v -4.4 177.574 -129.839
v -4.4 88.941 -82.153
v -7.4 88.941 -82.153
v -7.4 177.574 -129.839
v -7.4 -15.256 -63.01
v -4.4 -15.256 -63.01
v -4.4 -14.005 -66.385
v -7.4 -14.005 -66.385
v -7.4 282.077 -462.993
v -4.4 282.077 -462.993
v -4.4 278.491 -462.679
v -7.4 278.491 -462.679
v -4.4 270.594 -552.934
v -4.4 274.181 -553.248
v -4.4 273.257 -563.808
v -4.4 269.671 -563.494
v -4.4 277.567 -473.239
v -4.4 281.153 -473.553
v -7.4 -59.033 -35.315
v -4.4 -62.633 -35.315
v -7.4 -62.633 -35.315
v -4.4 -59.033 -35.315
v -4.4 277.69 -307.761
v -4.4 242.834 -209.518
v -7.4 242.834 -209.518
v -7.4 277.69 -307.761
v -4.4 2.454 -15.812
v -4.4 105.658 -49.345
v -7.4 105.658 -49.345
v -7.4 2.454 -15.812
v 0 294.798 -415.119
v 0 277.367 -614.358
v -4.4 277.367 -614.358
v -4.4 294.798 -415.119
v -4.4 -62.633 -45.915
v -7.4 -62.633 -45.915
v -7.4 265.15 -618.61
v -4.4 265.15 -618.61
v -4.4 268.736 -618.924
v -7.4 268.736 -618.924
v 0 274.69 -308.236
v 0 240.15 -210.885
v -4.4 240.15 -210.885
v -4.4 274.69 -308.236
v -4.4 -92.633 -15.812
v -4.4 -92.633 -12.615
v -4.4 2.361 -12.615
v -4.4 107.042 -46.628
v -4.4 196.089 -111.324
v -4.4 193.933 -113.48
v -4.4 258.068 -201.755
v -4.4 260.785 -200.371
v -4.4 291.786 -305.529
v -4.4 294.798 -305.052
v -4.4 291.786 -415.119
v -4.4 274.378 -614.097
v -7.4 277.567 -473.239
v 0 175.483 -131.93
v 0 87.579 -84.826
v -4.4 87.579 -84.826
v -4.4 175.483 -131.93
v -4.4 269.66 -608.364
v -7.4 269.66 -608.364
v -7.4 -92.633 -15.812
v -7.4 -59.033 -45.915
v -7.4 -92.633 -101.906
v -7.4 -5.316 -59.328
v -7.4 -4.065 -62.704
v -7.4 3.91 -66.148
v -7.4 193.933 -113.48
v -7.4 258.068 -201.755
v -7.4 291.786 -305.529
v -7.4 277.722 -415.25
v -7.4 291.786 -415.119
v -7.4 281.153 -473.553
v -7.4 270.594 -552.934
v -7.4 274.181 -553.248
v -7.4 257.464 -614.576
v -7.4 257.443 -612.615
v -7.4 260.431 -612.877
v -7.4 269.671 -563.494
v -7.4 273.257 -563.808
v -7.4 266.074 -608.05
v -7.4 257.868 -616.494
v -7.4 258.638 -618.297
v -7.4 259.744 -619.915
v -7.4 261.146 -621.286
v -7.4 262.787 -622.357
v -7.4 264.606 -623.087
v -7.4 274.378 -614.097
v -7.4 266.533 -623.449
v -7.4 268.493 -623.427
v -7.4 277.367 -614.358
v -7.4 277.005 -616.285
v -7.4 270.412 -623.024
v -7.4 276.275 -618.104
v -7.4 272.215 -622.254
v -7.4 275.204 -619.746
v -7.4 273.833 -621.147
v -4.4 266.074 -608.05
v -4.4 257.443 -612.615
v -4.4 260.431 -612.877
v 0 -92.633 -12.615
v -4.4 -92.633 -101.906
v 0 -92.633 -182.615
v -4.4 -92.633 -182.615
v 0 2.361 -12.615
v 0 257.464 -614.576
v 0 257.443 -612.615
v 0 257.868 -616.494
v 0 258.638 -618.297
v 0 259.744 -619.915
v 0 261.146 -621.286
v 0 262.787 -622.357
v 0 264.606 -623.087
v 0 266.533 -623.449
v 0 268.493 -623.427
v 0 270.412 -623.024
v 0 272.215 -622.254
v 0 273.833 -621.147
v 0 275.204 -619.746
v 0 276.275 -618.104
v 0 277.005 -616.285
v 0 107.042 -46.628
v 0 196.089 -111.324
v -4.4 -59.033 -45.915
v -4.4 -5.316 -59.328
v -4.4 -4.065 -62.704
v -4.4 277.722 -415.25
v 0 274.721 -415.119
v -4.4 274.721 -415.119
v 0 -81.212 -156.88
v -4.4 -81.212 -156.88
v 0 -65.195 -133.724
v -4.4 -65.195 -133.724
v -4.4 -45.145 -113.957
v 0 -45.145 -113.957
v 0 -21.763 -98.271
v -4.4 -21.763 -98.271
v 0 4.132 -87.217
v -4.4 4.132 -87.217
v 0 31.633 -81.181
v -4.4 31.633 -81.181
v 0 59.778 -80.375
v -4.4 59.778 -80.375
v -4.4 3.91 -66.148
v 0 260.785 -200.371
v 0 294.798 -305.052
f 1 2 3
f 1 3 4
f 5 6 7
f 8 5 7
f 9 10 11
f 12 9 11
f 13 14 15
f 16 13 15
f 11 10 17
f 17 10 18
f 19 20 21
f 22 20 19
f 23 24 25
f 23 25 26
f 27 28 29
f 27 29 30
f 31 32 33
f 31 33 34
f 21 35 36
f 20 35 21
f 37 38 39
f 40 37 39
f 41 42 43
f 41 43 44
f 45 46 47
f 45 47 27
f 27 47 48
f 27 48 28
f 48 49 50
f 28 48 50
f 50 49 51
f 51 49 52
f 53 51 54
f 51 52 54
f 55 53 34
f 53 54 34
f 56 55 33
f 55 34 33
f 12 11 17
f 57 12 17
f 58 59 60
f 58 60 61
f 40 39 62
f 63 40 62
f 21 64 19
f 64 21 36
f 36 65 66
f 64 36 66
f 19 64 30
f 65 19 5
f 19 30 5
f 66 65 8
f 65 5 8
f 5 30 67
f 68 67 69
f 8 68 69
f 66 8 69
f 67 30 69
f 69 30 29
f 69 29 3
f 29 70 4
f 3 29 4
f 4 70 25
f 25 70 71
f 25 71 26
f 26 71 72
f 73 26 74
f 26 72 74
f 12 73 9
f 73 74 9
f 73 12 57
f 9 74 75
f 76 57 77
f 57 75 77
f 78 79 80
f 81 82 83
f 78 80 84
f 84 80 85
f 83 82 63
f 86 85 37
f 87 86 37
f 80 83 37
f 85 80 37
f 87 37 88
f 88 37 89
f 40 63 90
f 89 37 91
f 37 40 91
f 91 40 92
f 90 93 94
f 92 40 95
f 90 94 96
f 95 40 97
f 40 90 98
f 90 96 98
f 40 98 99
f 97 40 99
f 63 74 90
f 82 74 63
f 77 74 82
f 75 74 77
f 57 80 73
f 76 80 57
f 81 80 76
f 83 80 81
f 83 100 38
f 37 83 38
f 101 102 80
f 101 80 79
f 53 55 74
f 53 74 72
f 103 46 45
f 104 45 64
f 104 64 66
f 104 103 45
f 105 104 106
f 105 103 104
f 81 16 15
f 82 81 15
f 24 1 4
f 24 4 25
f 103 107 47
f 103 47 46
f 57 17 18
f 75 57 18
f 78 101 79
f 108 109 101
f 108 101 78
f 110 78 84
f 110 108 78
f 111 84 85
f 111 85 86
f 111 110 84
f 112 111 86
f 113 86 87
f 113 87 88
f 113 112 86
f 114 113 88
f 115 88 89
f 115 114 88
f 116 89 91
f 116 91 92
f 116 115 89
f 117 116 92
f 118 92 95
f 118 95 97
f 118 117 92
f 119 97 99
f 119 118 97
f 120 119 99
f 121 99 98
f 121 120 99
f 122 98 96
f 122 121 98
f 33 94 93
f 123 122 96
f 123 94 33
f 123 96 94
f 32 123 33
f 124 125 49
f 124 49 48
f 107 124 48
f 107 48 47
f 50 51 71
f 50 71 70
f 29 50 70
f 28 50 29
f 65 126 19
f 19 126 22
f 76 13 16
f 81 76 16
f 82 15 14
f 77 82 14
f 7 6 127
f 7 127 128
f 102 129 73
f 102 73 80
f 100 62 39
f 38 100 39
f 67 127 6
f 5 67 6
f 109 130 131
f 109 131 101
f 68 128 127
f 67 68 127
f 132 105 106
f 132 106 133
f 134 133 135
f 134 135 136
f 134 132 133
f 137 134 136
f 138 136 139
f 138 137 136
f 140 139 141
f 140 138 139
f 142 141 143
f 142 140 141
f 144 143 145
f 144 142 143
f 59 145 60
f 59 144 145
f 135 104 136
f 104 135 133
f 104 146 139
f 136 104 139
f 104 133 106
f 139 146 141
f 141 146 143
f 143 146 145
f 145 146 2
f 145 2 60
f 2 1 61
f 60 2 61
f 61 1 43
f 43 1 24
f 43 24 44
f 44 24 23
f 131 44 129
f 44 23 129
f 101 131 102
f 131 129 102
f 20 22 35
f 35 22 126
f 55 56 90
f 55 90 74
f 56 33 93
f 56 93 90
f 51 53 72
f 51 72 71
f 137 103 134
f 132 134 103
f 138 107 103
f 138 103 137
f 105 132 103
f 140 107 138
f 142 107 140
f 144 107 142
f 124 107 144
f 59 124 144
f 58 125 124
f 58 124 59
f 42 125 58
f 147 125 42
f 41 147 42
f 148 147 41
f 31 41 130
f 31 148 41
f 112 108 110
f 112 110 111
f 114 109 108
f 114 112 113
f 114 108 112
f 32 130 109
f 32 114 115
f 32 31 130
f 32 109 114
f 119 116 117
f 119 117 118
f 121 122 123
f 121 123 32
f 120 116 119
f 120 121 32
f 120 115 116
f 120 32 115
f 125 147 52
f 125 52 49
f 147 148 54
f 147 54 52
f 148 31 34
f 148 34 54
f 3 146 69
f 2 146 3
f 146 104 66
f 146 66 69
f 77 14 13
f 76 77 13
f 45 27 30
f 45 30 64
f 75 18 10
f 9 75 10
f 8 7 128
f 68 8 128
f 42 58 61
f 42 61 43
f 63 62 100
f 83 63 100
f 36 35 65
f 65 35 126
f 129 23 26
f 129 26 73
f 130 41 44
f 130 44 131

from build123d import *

# Parameters (mm, degrees)
BOSS_EXTRUDE1_DEPTH = 4.4
SKETCH2_W           = 10.6
SKETCH2_H           = 3.6
BOSS_EXTRUDE2_DEPTH = 3


with BuildPart() as part:
    # Sketch1 → Boss-Extrude1 (new body)
    with BuildSketch(Plane(origin=(0, 0, 0), x_dir=(0, 0, -1), z_dir=(1, 0, 0))):
        with BuildLine():
            Line((12.615293263, -92.633282396), (182.615293263, -92.633282396))
            ThreePointArc((182.615293263, -92.633282396), (98.271459614, -21.762843967), (84.825943994, 87.579368501))
            Line((84.825943994, 87.579368501), (131.929787104, 175.483372313))
            Line((131.929787104, 175.483372313), (210.884858569, 240.150484061))
            Line((210.884858569, 240.150484061), (308.236471933, 274.689971372))
            Line((308.236471933, 274.689971372), (415.1194685, 274.721469403))
            Line((415.1194685, 274.721469403), (612.615293263, 257.442823643))
            ThreePointArc((612.615293263, 257.442823643), (623.448797672, 266.533213196), (614.358408118, 277.366717604))
            Line((614.358408118, 277.366717604), (415.1194685, 294.797866154))
            Line((415.1194685, 294.797866154), (305.051694272, 294.797866154))
            Line((305.051694272, 294.797866154), (200.371020359, 260.785053385))
            Line((200.371020359, 260.785053385), (111.324320476, 196.088838941))
            Line((111.324320476, 196.088838941), (46.628106033, 107.042139058))
            Line((46.628106033, 107.042139058), (12.615293263, 2.361465145))
            Line((12.615293263, 2.361465145), (12.615293263, -92.633282396))
        make_face()
    extrude(amount=-BOSS_EXTRUDE1_DEPTH)

    # Sketch2 → Boss-Extrude2 (add)
    with BuildSketch(Plane.ZY.offset(4.4)):
        with BuildLine():
            Line((-614.358408118, 277.366717604), (-614.09694089, 274.37813351))
            Line((-614.09694089, 274.37813351), (-415.1194685, 291.786406641))
            Line((-415.1194685, 291.786406641), (-305.528662602, 291.786406641))
            Line((-305.528662602, 291.786406641), (-201.755236364, 258.068376511))
            Line((-201.755236364, 258.068376511), (-113.48028745, 193.932871967))
            Line((-113.48028745, 193.932871967), (-49.344782906, 105.657923053))
            Line((-49.344782906, 105.657923053), (-15.811778295, 2.453946809))
            Line((-15.811778295, 2.453946809), (-15.811778295, -92.633282396))
            Line((-15.811778295, -92.633282396), (-101.905821199, -92.633282396))
            Line((-101.905821199, -92.633282396), (-66.148126422, 3.910293146))
            Line((-66.148126422, 3.910293146), (-82.152924422, 88.94134))
            Line((-82.152924422, 88.94134), (-129.839029338, 177.574130079))
            Line((-129.839029338, 177.574130079), (-209.517623645, 242.833833686))
            Line((-209.517623645, 242.833833686), (-307.761340769, 277.689831483))
            Line((-307.761340769, 277.689831483), (-415.250010124, 277.721508004))
            Line((-415.250010124, 277.721508004), (-612.876760491, 260.431407737))
            Line((-612.876760491, 260.431407737), (-612.615293263, 257.442823643))
            ThreePointArc((-612.615293263, 257.442823643), (-623.448797672, 266.533213196), (-614.358408118, 277.366717604))
        make_face()
        with Locations((-40.615293263, -60.833282396)):
            Rectangle(SKETCH2_W, SKETCH2_H, mode=Mode.SUBTRACT)
        Polygon((-563.8078494, 273.256849808), (-553.2481856, 274.180700681), (-552.934424927, 270.594399768), (-563.494088726, 269.670548895), align=None, mode=Mode.SUBTRACT)
        Polygon((-473.552609753, 281.153160101), (-462.992945953, 282.077010974), (-462.679185279, 278.490710061), (-473.238849079, 277.566859188), align=None, mode=Mode.SUBTRACT)
        Polygon((-618.923562928, 268.735995644), (-608.363899128, 269.659846517), (-608.050138454, 266.073545604), (-618.609802254, 265.14969473), align=None, mode=Mode.SUBTRACT)
        Polygon((-62.703811589, -4.065338583), (-59.327925332, -5.315695323), (-63.009531289, -15.255804859), (-66.385417546, -14.005448119), align=None, mode=Mode.SUBTRACT)
    extrude(amount=BOSS_EXTRUDE2_DEPTH)


solid = part.part
